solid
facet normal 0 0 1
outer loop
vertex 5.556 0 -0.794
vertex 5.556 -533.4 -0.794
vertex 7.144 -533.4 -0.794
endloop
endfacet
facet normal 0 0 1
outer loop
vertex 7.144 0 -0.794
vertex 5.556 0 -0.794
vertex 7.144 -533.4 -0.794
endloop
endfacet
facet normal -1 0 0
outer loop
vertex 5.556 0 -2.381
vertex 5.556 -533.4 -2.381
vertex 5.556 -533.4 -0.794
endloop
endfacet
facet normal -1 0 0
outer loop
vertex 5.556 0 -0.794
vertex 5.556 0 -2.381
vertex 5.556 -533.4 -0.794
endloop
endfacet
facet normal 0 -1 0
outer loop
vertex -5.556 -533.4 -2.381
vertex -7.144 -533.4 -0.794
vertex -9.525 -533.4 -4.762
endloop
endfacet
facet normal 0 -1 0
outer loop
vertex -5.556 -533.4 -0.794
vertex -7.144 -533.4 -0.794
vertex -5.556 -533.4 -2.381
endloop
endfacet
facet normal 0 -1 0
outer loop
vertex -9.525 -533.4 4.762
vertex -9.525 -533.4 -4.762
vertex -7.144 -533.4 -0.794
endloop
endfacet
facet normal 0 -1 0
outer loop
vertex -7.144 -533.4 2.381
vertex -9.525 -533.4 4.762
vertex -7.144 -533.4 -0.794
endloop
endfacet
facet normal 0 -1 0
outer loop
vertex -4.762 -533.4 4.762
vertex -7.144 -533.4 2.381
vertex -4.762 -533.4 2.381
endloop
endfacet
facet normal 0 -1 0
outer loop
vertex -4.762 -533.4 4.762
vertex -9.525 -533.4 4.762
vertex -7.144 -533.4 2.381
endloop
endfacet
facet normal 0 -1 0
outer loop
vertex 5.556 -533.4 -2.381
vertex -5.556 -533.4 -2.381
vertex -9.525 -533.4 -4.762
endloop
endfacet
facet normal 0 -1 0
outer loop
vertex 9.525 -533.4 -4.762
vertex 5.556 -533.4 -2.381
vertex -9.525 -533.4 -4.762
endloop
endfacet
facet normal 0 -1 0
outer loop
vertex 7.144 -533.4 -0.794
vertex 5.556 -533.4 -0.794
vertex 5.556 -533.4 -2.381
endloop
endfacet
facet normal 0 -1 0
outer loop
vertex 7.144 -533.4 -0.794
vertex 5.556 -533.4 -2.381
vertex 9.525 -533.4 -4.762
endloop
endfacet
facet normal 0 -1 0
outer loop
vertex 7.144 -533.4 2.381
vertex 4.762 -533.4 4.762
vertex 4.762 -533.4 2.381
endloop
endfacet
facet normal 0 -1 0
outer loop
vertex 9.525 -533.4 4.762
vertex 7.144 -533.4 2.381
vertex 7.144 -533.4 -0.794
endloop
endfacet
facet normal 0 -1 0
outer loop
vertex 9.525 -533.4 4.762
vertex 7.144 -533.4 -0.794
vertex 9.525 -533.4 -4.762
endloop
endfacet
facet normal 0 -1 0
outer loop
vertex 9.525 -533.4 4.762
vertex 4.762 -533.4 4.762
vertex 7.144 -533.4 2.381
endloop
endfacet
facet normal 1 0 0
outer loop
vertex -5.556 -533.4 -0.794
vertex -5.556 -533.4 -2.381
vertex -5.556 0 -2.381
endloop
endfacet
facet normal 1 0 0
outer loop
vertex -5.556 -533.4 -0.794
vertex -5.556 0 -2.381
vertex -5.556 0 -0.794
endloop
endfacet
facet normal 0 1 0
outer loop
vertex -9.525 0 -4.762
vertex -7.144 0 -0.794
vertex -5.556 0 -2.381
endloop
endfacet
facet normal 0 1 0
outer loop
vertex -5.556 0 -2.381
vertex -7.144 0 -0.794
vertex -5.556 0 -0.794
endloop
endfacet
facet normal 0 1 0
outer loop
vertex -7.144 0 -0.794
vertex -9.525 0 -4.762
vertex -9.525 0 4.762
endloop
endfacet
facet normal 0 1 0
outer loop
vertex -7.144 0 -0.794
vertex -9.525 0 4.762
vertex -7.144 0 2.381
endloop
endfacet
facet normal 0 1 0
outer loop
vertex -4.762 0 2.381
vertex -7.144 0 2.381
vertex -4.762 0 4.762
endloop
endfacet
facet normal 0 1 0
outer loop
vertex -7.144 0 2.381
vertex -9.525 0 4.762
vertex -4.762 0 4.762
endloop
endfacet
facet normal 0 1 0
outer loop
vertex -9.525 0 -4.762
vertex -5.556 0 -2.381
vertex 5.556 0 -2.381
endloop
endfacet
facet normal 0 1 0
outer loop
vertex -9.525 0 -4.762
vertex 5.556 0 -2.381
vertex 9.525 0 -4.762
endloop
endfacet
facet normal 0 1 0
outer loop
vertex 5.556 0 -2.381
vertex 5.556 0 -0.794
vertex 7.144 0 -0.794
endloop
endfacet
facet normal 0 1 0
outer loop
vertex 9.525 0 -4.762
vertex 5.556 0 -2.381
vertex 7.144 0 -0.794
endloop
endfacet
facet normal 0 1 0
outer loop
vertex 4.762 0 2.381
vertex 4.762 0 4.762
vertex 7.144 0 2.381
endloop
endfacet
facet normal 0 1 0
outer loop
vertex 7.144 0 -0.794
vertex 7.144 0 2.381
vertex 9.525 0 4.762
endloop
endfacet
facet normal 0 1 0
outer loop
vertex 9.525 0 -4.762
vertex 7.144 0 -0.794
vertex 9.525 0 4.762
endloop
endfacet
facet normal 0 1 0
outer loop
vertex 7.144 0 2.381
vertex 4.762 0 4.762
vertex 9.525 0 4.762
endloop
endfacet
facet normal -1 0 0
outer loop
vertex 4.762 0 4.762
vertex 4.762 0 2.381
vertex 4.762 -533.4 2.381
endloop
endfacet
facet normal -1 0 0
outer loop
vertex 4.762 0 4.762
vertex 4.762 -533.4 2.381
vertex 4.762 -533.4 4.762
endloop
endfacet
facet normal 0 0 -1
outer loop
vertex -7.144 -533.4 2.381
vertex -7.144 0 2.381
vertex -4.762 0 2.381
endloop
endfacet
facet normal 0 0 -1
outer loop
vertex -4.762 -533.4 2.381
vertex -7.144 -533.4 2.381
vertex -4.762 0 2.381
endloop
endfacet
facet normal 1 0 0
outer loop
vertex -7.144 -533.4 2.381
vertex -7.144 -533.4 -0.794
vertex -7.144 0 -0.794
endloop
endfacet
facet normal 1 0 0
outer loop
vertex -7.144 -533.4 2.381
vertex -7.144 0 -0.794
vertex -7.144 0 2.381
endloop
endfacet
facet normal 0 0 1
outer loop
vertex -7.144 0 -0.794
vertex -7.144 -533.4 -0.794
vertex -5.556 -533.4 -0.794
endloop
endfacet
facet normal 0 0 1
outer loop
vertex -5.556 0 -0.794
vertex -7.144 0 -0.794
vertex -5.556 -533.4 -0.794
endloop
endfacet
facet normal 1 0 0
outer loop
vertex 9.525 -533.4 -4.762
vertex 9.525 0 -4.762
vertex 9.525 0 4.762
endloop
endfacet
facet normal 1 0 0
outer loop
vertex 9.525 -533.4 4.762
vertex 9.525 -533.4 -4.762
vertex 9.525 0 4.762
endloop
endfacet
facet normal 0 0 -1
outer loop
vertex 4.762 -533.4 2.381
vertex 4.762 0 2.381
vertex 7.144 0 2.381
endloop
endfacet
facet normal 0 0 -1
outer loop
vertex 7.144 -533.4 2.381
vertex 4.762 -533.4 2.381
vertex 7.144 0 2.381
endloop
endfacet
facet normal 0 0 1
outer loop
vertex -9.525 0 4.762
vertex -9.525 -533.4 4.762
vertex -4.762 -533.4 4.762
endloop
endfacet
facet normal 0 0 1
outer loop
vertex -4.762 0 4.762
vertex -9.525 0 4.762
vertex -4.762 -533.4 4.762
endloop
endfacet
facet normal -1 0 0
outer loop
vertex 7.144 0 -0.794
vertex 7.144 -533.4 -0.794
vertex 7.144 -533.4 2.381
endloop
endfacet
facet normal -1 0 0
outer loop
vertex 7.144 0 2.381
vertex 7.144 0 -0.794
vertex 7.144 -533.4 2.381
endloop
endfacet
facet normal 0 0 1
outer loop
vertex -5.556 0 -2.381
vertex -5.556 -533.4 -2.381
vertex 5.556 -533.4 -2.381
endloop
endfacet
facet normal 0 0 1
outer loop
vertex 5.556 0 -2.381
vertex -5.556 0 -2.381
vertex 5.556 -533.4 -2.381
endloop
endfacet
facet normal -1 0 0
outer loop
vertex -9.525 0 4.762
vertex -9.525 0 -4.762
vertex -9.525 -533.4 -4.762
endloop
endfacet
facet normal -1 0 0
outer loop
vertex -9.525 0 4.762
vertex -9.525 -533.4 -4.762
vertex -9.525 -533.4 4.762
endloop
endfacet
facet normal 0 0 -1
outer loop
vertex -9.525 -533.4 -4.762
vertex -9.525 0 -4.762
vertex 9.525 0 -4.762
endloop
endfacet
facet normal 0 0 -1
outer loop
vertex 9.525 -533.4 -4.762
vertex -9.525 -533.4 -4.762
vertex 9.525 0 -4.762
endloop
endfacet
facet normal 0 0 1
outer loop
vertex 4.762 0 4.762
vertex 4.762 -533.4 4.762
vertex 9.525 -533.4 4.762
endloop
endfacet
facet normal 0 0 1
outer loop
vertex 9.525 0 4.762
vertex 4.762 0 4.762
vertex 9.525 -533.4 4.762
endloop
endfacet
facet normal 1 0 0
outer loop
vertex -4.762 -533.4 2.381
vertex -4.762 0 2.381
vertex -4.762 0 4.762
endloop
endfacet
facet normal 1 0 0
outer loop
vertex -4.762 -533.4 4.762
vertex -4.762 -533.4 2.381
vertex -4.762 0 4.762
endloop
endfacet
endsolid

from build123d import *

# Parameters (mm, degrees)
SKETCH_W        = 19.05
SKETCH_H        = 9.525
PAD_DEPTH       = 533.4
SKETCH001_W     = 9.525
SKETCH001_H     = 2.38125
POCKET_DEPTH    = 533.401
SKETCH002_W     = 14.2875
SKETCH002_H     = 3.175
POCKET001_DEPTH = 533.401
SKETCH003_W     = 11.1125
SKETCH003_H     = 1.5875
POCKET002_DEPTH = 533.401


with BuildPart() as part:
    # Sketch → Pad (new body)
    with BuildSketch(Plane.XZ):
        Rectangle(SKETCH_W, SKETCH_H)
    extrude(amount=PAD_DEPTH)

    # Sketch001 (on Face6 of Pad) → Pocket (cut, through all)
    with BuildSketch(Plane.XZ.offset(533.4)):
        with Locations((0, 3.571875)):
            Rectangle(SKETCH001_W, SKETCH001_H)
    extrude(amount=-POCKET_DEPTH, mode=Mode.SUBTRACT)

    # Sketch002 (on Face5 of Pocket) → Pocket001 (cut, through all)
    with BuildSketch(Plane.XZ.offset(533.4)):
        with Locations((0, 0.79375)):
            Rectangle(SKETCH002_W, SKETCH002_H)
    extrude(amount=-POCKET001_DEPTH, mode=Mode.SUBTRACT)

    # Sketch003 (on Face5 of Pocket001) → Pocket002 (cut, through all)
    with BuildSketch(Plane.XZ.offset(533.4)):
        with Locations((0, -1.5875)):
            Rectangle(SKETCH003_W, SKETCH003_H)
    extrude(amount=-POCKET002_DEPTH, mode=Mode.SUBTRACT)


solid = part.part
